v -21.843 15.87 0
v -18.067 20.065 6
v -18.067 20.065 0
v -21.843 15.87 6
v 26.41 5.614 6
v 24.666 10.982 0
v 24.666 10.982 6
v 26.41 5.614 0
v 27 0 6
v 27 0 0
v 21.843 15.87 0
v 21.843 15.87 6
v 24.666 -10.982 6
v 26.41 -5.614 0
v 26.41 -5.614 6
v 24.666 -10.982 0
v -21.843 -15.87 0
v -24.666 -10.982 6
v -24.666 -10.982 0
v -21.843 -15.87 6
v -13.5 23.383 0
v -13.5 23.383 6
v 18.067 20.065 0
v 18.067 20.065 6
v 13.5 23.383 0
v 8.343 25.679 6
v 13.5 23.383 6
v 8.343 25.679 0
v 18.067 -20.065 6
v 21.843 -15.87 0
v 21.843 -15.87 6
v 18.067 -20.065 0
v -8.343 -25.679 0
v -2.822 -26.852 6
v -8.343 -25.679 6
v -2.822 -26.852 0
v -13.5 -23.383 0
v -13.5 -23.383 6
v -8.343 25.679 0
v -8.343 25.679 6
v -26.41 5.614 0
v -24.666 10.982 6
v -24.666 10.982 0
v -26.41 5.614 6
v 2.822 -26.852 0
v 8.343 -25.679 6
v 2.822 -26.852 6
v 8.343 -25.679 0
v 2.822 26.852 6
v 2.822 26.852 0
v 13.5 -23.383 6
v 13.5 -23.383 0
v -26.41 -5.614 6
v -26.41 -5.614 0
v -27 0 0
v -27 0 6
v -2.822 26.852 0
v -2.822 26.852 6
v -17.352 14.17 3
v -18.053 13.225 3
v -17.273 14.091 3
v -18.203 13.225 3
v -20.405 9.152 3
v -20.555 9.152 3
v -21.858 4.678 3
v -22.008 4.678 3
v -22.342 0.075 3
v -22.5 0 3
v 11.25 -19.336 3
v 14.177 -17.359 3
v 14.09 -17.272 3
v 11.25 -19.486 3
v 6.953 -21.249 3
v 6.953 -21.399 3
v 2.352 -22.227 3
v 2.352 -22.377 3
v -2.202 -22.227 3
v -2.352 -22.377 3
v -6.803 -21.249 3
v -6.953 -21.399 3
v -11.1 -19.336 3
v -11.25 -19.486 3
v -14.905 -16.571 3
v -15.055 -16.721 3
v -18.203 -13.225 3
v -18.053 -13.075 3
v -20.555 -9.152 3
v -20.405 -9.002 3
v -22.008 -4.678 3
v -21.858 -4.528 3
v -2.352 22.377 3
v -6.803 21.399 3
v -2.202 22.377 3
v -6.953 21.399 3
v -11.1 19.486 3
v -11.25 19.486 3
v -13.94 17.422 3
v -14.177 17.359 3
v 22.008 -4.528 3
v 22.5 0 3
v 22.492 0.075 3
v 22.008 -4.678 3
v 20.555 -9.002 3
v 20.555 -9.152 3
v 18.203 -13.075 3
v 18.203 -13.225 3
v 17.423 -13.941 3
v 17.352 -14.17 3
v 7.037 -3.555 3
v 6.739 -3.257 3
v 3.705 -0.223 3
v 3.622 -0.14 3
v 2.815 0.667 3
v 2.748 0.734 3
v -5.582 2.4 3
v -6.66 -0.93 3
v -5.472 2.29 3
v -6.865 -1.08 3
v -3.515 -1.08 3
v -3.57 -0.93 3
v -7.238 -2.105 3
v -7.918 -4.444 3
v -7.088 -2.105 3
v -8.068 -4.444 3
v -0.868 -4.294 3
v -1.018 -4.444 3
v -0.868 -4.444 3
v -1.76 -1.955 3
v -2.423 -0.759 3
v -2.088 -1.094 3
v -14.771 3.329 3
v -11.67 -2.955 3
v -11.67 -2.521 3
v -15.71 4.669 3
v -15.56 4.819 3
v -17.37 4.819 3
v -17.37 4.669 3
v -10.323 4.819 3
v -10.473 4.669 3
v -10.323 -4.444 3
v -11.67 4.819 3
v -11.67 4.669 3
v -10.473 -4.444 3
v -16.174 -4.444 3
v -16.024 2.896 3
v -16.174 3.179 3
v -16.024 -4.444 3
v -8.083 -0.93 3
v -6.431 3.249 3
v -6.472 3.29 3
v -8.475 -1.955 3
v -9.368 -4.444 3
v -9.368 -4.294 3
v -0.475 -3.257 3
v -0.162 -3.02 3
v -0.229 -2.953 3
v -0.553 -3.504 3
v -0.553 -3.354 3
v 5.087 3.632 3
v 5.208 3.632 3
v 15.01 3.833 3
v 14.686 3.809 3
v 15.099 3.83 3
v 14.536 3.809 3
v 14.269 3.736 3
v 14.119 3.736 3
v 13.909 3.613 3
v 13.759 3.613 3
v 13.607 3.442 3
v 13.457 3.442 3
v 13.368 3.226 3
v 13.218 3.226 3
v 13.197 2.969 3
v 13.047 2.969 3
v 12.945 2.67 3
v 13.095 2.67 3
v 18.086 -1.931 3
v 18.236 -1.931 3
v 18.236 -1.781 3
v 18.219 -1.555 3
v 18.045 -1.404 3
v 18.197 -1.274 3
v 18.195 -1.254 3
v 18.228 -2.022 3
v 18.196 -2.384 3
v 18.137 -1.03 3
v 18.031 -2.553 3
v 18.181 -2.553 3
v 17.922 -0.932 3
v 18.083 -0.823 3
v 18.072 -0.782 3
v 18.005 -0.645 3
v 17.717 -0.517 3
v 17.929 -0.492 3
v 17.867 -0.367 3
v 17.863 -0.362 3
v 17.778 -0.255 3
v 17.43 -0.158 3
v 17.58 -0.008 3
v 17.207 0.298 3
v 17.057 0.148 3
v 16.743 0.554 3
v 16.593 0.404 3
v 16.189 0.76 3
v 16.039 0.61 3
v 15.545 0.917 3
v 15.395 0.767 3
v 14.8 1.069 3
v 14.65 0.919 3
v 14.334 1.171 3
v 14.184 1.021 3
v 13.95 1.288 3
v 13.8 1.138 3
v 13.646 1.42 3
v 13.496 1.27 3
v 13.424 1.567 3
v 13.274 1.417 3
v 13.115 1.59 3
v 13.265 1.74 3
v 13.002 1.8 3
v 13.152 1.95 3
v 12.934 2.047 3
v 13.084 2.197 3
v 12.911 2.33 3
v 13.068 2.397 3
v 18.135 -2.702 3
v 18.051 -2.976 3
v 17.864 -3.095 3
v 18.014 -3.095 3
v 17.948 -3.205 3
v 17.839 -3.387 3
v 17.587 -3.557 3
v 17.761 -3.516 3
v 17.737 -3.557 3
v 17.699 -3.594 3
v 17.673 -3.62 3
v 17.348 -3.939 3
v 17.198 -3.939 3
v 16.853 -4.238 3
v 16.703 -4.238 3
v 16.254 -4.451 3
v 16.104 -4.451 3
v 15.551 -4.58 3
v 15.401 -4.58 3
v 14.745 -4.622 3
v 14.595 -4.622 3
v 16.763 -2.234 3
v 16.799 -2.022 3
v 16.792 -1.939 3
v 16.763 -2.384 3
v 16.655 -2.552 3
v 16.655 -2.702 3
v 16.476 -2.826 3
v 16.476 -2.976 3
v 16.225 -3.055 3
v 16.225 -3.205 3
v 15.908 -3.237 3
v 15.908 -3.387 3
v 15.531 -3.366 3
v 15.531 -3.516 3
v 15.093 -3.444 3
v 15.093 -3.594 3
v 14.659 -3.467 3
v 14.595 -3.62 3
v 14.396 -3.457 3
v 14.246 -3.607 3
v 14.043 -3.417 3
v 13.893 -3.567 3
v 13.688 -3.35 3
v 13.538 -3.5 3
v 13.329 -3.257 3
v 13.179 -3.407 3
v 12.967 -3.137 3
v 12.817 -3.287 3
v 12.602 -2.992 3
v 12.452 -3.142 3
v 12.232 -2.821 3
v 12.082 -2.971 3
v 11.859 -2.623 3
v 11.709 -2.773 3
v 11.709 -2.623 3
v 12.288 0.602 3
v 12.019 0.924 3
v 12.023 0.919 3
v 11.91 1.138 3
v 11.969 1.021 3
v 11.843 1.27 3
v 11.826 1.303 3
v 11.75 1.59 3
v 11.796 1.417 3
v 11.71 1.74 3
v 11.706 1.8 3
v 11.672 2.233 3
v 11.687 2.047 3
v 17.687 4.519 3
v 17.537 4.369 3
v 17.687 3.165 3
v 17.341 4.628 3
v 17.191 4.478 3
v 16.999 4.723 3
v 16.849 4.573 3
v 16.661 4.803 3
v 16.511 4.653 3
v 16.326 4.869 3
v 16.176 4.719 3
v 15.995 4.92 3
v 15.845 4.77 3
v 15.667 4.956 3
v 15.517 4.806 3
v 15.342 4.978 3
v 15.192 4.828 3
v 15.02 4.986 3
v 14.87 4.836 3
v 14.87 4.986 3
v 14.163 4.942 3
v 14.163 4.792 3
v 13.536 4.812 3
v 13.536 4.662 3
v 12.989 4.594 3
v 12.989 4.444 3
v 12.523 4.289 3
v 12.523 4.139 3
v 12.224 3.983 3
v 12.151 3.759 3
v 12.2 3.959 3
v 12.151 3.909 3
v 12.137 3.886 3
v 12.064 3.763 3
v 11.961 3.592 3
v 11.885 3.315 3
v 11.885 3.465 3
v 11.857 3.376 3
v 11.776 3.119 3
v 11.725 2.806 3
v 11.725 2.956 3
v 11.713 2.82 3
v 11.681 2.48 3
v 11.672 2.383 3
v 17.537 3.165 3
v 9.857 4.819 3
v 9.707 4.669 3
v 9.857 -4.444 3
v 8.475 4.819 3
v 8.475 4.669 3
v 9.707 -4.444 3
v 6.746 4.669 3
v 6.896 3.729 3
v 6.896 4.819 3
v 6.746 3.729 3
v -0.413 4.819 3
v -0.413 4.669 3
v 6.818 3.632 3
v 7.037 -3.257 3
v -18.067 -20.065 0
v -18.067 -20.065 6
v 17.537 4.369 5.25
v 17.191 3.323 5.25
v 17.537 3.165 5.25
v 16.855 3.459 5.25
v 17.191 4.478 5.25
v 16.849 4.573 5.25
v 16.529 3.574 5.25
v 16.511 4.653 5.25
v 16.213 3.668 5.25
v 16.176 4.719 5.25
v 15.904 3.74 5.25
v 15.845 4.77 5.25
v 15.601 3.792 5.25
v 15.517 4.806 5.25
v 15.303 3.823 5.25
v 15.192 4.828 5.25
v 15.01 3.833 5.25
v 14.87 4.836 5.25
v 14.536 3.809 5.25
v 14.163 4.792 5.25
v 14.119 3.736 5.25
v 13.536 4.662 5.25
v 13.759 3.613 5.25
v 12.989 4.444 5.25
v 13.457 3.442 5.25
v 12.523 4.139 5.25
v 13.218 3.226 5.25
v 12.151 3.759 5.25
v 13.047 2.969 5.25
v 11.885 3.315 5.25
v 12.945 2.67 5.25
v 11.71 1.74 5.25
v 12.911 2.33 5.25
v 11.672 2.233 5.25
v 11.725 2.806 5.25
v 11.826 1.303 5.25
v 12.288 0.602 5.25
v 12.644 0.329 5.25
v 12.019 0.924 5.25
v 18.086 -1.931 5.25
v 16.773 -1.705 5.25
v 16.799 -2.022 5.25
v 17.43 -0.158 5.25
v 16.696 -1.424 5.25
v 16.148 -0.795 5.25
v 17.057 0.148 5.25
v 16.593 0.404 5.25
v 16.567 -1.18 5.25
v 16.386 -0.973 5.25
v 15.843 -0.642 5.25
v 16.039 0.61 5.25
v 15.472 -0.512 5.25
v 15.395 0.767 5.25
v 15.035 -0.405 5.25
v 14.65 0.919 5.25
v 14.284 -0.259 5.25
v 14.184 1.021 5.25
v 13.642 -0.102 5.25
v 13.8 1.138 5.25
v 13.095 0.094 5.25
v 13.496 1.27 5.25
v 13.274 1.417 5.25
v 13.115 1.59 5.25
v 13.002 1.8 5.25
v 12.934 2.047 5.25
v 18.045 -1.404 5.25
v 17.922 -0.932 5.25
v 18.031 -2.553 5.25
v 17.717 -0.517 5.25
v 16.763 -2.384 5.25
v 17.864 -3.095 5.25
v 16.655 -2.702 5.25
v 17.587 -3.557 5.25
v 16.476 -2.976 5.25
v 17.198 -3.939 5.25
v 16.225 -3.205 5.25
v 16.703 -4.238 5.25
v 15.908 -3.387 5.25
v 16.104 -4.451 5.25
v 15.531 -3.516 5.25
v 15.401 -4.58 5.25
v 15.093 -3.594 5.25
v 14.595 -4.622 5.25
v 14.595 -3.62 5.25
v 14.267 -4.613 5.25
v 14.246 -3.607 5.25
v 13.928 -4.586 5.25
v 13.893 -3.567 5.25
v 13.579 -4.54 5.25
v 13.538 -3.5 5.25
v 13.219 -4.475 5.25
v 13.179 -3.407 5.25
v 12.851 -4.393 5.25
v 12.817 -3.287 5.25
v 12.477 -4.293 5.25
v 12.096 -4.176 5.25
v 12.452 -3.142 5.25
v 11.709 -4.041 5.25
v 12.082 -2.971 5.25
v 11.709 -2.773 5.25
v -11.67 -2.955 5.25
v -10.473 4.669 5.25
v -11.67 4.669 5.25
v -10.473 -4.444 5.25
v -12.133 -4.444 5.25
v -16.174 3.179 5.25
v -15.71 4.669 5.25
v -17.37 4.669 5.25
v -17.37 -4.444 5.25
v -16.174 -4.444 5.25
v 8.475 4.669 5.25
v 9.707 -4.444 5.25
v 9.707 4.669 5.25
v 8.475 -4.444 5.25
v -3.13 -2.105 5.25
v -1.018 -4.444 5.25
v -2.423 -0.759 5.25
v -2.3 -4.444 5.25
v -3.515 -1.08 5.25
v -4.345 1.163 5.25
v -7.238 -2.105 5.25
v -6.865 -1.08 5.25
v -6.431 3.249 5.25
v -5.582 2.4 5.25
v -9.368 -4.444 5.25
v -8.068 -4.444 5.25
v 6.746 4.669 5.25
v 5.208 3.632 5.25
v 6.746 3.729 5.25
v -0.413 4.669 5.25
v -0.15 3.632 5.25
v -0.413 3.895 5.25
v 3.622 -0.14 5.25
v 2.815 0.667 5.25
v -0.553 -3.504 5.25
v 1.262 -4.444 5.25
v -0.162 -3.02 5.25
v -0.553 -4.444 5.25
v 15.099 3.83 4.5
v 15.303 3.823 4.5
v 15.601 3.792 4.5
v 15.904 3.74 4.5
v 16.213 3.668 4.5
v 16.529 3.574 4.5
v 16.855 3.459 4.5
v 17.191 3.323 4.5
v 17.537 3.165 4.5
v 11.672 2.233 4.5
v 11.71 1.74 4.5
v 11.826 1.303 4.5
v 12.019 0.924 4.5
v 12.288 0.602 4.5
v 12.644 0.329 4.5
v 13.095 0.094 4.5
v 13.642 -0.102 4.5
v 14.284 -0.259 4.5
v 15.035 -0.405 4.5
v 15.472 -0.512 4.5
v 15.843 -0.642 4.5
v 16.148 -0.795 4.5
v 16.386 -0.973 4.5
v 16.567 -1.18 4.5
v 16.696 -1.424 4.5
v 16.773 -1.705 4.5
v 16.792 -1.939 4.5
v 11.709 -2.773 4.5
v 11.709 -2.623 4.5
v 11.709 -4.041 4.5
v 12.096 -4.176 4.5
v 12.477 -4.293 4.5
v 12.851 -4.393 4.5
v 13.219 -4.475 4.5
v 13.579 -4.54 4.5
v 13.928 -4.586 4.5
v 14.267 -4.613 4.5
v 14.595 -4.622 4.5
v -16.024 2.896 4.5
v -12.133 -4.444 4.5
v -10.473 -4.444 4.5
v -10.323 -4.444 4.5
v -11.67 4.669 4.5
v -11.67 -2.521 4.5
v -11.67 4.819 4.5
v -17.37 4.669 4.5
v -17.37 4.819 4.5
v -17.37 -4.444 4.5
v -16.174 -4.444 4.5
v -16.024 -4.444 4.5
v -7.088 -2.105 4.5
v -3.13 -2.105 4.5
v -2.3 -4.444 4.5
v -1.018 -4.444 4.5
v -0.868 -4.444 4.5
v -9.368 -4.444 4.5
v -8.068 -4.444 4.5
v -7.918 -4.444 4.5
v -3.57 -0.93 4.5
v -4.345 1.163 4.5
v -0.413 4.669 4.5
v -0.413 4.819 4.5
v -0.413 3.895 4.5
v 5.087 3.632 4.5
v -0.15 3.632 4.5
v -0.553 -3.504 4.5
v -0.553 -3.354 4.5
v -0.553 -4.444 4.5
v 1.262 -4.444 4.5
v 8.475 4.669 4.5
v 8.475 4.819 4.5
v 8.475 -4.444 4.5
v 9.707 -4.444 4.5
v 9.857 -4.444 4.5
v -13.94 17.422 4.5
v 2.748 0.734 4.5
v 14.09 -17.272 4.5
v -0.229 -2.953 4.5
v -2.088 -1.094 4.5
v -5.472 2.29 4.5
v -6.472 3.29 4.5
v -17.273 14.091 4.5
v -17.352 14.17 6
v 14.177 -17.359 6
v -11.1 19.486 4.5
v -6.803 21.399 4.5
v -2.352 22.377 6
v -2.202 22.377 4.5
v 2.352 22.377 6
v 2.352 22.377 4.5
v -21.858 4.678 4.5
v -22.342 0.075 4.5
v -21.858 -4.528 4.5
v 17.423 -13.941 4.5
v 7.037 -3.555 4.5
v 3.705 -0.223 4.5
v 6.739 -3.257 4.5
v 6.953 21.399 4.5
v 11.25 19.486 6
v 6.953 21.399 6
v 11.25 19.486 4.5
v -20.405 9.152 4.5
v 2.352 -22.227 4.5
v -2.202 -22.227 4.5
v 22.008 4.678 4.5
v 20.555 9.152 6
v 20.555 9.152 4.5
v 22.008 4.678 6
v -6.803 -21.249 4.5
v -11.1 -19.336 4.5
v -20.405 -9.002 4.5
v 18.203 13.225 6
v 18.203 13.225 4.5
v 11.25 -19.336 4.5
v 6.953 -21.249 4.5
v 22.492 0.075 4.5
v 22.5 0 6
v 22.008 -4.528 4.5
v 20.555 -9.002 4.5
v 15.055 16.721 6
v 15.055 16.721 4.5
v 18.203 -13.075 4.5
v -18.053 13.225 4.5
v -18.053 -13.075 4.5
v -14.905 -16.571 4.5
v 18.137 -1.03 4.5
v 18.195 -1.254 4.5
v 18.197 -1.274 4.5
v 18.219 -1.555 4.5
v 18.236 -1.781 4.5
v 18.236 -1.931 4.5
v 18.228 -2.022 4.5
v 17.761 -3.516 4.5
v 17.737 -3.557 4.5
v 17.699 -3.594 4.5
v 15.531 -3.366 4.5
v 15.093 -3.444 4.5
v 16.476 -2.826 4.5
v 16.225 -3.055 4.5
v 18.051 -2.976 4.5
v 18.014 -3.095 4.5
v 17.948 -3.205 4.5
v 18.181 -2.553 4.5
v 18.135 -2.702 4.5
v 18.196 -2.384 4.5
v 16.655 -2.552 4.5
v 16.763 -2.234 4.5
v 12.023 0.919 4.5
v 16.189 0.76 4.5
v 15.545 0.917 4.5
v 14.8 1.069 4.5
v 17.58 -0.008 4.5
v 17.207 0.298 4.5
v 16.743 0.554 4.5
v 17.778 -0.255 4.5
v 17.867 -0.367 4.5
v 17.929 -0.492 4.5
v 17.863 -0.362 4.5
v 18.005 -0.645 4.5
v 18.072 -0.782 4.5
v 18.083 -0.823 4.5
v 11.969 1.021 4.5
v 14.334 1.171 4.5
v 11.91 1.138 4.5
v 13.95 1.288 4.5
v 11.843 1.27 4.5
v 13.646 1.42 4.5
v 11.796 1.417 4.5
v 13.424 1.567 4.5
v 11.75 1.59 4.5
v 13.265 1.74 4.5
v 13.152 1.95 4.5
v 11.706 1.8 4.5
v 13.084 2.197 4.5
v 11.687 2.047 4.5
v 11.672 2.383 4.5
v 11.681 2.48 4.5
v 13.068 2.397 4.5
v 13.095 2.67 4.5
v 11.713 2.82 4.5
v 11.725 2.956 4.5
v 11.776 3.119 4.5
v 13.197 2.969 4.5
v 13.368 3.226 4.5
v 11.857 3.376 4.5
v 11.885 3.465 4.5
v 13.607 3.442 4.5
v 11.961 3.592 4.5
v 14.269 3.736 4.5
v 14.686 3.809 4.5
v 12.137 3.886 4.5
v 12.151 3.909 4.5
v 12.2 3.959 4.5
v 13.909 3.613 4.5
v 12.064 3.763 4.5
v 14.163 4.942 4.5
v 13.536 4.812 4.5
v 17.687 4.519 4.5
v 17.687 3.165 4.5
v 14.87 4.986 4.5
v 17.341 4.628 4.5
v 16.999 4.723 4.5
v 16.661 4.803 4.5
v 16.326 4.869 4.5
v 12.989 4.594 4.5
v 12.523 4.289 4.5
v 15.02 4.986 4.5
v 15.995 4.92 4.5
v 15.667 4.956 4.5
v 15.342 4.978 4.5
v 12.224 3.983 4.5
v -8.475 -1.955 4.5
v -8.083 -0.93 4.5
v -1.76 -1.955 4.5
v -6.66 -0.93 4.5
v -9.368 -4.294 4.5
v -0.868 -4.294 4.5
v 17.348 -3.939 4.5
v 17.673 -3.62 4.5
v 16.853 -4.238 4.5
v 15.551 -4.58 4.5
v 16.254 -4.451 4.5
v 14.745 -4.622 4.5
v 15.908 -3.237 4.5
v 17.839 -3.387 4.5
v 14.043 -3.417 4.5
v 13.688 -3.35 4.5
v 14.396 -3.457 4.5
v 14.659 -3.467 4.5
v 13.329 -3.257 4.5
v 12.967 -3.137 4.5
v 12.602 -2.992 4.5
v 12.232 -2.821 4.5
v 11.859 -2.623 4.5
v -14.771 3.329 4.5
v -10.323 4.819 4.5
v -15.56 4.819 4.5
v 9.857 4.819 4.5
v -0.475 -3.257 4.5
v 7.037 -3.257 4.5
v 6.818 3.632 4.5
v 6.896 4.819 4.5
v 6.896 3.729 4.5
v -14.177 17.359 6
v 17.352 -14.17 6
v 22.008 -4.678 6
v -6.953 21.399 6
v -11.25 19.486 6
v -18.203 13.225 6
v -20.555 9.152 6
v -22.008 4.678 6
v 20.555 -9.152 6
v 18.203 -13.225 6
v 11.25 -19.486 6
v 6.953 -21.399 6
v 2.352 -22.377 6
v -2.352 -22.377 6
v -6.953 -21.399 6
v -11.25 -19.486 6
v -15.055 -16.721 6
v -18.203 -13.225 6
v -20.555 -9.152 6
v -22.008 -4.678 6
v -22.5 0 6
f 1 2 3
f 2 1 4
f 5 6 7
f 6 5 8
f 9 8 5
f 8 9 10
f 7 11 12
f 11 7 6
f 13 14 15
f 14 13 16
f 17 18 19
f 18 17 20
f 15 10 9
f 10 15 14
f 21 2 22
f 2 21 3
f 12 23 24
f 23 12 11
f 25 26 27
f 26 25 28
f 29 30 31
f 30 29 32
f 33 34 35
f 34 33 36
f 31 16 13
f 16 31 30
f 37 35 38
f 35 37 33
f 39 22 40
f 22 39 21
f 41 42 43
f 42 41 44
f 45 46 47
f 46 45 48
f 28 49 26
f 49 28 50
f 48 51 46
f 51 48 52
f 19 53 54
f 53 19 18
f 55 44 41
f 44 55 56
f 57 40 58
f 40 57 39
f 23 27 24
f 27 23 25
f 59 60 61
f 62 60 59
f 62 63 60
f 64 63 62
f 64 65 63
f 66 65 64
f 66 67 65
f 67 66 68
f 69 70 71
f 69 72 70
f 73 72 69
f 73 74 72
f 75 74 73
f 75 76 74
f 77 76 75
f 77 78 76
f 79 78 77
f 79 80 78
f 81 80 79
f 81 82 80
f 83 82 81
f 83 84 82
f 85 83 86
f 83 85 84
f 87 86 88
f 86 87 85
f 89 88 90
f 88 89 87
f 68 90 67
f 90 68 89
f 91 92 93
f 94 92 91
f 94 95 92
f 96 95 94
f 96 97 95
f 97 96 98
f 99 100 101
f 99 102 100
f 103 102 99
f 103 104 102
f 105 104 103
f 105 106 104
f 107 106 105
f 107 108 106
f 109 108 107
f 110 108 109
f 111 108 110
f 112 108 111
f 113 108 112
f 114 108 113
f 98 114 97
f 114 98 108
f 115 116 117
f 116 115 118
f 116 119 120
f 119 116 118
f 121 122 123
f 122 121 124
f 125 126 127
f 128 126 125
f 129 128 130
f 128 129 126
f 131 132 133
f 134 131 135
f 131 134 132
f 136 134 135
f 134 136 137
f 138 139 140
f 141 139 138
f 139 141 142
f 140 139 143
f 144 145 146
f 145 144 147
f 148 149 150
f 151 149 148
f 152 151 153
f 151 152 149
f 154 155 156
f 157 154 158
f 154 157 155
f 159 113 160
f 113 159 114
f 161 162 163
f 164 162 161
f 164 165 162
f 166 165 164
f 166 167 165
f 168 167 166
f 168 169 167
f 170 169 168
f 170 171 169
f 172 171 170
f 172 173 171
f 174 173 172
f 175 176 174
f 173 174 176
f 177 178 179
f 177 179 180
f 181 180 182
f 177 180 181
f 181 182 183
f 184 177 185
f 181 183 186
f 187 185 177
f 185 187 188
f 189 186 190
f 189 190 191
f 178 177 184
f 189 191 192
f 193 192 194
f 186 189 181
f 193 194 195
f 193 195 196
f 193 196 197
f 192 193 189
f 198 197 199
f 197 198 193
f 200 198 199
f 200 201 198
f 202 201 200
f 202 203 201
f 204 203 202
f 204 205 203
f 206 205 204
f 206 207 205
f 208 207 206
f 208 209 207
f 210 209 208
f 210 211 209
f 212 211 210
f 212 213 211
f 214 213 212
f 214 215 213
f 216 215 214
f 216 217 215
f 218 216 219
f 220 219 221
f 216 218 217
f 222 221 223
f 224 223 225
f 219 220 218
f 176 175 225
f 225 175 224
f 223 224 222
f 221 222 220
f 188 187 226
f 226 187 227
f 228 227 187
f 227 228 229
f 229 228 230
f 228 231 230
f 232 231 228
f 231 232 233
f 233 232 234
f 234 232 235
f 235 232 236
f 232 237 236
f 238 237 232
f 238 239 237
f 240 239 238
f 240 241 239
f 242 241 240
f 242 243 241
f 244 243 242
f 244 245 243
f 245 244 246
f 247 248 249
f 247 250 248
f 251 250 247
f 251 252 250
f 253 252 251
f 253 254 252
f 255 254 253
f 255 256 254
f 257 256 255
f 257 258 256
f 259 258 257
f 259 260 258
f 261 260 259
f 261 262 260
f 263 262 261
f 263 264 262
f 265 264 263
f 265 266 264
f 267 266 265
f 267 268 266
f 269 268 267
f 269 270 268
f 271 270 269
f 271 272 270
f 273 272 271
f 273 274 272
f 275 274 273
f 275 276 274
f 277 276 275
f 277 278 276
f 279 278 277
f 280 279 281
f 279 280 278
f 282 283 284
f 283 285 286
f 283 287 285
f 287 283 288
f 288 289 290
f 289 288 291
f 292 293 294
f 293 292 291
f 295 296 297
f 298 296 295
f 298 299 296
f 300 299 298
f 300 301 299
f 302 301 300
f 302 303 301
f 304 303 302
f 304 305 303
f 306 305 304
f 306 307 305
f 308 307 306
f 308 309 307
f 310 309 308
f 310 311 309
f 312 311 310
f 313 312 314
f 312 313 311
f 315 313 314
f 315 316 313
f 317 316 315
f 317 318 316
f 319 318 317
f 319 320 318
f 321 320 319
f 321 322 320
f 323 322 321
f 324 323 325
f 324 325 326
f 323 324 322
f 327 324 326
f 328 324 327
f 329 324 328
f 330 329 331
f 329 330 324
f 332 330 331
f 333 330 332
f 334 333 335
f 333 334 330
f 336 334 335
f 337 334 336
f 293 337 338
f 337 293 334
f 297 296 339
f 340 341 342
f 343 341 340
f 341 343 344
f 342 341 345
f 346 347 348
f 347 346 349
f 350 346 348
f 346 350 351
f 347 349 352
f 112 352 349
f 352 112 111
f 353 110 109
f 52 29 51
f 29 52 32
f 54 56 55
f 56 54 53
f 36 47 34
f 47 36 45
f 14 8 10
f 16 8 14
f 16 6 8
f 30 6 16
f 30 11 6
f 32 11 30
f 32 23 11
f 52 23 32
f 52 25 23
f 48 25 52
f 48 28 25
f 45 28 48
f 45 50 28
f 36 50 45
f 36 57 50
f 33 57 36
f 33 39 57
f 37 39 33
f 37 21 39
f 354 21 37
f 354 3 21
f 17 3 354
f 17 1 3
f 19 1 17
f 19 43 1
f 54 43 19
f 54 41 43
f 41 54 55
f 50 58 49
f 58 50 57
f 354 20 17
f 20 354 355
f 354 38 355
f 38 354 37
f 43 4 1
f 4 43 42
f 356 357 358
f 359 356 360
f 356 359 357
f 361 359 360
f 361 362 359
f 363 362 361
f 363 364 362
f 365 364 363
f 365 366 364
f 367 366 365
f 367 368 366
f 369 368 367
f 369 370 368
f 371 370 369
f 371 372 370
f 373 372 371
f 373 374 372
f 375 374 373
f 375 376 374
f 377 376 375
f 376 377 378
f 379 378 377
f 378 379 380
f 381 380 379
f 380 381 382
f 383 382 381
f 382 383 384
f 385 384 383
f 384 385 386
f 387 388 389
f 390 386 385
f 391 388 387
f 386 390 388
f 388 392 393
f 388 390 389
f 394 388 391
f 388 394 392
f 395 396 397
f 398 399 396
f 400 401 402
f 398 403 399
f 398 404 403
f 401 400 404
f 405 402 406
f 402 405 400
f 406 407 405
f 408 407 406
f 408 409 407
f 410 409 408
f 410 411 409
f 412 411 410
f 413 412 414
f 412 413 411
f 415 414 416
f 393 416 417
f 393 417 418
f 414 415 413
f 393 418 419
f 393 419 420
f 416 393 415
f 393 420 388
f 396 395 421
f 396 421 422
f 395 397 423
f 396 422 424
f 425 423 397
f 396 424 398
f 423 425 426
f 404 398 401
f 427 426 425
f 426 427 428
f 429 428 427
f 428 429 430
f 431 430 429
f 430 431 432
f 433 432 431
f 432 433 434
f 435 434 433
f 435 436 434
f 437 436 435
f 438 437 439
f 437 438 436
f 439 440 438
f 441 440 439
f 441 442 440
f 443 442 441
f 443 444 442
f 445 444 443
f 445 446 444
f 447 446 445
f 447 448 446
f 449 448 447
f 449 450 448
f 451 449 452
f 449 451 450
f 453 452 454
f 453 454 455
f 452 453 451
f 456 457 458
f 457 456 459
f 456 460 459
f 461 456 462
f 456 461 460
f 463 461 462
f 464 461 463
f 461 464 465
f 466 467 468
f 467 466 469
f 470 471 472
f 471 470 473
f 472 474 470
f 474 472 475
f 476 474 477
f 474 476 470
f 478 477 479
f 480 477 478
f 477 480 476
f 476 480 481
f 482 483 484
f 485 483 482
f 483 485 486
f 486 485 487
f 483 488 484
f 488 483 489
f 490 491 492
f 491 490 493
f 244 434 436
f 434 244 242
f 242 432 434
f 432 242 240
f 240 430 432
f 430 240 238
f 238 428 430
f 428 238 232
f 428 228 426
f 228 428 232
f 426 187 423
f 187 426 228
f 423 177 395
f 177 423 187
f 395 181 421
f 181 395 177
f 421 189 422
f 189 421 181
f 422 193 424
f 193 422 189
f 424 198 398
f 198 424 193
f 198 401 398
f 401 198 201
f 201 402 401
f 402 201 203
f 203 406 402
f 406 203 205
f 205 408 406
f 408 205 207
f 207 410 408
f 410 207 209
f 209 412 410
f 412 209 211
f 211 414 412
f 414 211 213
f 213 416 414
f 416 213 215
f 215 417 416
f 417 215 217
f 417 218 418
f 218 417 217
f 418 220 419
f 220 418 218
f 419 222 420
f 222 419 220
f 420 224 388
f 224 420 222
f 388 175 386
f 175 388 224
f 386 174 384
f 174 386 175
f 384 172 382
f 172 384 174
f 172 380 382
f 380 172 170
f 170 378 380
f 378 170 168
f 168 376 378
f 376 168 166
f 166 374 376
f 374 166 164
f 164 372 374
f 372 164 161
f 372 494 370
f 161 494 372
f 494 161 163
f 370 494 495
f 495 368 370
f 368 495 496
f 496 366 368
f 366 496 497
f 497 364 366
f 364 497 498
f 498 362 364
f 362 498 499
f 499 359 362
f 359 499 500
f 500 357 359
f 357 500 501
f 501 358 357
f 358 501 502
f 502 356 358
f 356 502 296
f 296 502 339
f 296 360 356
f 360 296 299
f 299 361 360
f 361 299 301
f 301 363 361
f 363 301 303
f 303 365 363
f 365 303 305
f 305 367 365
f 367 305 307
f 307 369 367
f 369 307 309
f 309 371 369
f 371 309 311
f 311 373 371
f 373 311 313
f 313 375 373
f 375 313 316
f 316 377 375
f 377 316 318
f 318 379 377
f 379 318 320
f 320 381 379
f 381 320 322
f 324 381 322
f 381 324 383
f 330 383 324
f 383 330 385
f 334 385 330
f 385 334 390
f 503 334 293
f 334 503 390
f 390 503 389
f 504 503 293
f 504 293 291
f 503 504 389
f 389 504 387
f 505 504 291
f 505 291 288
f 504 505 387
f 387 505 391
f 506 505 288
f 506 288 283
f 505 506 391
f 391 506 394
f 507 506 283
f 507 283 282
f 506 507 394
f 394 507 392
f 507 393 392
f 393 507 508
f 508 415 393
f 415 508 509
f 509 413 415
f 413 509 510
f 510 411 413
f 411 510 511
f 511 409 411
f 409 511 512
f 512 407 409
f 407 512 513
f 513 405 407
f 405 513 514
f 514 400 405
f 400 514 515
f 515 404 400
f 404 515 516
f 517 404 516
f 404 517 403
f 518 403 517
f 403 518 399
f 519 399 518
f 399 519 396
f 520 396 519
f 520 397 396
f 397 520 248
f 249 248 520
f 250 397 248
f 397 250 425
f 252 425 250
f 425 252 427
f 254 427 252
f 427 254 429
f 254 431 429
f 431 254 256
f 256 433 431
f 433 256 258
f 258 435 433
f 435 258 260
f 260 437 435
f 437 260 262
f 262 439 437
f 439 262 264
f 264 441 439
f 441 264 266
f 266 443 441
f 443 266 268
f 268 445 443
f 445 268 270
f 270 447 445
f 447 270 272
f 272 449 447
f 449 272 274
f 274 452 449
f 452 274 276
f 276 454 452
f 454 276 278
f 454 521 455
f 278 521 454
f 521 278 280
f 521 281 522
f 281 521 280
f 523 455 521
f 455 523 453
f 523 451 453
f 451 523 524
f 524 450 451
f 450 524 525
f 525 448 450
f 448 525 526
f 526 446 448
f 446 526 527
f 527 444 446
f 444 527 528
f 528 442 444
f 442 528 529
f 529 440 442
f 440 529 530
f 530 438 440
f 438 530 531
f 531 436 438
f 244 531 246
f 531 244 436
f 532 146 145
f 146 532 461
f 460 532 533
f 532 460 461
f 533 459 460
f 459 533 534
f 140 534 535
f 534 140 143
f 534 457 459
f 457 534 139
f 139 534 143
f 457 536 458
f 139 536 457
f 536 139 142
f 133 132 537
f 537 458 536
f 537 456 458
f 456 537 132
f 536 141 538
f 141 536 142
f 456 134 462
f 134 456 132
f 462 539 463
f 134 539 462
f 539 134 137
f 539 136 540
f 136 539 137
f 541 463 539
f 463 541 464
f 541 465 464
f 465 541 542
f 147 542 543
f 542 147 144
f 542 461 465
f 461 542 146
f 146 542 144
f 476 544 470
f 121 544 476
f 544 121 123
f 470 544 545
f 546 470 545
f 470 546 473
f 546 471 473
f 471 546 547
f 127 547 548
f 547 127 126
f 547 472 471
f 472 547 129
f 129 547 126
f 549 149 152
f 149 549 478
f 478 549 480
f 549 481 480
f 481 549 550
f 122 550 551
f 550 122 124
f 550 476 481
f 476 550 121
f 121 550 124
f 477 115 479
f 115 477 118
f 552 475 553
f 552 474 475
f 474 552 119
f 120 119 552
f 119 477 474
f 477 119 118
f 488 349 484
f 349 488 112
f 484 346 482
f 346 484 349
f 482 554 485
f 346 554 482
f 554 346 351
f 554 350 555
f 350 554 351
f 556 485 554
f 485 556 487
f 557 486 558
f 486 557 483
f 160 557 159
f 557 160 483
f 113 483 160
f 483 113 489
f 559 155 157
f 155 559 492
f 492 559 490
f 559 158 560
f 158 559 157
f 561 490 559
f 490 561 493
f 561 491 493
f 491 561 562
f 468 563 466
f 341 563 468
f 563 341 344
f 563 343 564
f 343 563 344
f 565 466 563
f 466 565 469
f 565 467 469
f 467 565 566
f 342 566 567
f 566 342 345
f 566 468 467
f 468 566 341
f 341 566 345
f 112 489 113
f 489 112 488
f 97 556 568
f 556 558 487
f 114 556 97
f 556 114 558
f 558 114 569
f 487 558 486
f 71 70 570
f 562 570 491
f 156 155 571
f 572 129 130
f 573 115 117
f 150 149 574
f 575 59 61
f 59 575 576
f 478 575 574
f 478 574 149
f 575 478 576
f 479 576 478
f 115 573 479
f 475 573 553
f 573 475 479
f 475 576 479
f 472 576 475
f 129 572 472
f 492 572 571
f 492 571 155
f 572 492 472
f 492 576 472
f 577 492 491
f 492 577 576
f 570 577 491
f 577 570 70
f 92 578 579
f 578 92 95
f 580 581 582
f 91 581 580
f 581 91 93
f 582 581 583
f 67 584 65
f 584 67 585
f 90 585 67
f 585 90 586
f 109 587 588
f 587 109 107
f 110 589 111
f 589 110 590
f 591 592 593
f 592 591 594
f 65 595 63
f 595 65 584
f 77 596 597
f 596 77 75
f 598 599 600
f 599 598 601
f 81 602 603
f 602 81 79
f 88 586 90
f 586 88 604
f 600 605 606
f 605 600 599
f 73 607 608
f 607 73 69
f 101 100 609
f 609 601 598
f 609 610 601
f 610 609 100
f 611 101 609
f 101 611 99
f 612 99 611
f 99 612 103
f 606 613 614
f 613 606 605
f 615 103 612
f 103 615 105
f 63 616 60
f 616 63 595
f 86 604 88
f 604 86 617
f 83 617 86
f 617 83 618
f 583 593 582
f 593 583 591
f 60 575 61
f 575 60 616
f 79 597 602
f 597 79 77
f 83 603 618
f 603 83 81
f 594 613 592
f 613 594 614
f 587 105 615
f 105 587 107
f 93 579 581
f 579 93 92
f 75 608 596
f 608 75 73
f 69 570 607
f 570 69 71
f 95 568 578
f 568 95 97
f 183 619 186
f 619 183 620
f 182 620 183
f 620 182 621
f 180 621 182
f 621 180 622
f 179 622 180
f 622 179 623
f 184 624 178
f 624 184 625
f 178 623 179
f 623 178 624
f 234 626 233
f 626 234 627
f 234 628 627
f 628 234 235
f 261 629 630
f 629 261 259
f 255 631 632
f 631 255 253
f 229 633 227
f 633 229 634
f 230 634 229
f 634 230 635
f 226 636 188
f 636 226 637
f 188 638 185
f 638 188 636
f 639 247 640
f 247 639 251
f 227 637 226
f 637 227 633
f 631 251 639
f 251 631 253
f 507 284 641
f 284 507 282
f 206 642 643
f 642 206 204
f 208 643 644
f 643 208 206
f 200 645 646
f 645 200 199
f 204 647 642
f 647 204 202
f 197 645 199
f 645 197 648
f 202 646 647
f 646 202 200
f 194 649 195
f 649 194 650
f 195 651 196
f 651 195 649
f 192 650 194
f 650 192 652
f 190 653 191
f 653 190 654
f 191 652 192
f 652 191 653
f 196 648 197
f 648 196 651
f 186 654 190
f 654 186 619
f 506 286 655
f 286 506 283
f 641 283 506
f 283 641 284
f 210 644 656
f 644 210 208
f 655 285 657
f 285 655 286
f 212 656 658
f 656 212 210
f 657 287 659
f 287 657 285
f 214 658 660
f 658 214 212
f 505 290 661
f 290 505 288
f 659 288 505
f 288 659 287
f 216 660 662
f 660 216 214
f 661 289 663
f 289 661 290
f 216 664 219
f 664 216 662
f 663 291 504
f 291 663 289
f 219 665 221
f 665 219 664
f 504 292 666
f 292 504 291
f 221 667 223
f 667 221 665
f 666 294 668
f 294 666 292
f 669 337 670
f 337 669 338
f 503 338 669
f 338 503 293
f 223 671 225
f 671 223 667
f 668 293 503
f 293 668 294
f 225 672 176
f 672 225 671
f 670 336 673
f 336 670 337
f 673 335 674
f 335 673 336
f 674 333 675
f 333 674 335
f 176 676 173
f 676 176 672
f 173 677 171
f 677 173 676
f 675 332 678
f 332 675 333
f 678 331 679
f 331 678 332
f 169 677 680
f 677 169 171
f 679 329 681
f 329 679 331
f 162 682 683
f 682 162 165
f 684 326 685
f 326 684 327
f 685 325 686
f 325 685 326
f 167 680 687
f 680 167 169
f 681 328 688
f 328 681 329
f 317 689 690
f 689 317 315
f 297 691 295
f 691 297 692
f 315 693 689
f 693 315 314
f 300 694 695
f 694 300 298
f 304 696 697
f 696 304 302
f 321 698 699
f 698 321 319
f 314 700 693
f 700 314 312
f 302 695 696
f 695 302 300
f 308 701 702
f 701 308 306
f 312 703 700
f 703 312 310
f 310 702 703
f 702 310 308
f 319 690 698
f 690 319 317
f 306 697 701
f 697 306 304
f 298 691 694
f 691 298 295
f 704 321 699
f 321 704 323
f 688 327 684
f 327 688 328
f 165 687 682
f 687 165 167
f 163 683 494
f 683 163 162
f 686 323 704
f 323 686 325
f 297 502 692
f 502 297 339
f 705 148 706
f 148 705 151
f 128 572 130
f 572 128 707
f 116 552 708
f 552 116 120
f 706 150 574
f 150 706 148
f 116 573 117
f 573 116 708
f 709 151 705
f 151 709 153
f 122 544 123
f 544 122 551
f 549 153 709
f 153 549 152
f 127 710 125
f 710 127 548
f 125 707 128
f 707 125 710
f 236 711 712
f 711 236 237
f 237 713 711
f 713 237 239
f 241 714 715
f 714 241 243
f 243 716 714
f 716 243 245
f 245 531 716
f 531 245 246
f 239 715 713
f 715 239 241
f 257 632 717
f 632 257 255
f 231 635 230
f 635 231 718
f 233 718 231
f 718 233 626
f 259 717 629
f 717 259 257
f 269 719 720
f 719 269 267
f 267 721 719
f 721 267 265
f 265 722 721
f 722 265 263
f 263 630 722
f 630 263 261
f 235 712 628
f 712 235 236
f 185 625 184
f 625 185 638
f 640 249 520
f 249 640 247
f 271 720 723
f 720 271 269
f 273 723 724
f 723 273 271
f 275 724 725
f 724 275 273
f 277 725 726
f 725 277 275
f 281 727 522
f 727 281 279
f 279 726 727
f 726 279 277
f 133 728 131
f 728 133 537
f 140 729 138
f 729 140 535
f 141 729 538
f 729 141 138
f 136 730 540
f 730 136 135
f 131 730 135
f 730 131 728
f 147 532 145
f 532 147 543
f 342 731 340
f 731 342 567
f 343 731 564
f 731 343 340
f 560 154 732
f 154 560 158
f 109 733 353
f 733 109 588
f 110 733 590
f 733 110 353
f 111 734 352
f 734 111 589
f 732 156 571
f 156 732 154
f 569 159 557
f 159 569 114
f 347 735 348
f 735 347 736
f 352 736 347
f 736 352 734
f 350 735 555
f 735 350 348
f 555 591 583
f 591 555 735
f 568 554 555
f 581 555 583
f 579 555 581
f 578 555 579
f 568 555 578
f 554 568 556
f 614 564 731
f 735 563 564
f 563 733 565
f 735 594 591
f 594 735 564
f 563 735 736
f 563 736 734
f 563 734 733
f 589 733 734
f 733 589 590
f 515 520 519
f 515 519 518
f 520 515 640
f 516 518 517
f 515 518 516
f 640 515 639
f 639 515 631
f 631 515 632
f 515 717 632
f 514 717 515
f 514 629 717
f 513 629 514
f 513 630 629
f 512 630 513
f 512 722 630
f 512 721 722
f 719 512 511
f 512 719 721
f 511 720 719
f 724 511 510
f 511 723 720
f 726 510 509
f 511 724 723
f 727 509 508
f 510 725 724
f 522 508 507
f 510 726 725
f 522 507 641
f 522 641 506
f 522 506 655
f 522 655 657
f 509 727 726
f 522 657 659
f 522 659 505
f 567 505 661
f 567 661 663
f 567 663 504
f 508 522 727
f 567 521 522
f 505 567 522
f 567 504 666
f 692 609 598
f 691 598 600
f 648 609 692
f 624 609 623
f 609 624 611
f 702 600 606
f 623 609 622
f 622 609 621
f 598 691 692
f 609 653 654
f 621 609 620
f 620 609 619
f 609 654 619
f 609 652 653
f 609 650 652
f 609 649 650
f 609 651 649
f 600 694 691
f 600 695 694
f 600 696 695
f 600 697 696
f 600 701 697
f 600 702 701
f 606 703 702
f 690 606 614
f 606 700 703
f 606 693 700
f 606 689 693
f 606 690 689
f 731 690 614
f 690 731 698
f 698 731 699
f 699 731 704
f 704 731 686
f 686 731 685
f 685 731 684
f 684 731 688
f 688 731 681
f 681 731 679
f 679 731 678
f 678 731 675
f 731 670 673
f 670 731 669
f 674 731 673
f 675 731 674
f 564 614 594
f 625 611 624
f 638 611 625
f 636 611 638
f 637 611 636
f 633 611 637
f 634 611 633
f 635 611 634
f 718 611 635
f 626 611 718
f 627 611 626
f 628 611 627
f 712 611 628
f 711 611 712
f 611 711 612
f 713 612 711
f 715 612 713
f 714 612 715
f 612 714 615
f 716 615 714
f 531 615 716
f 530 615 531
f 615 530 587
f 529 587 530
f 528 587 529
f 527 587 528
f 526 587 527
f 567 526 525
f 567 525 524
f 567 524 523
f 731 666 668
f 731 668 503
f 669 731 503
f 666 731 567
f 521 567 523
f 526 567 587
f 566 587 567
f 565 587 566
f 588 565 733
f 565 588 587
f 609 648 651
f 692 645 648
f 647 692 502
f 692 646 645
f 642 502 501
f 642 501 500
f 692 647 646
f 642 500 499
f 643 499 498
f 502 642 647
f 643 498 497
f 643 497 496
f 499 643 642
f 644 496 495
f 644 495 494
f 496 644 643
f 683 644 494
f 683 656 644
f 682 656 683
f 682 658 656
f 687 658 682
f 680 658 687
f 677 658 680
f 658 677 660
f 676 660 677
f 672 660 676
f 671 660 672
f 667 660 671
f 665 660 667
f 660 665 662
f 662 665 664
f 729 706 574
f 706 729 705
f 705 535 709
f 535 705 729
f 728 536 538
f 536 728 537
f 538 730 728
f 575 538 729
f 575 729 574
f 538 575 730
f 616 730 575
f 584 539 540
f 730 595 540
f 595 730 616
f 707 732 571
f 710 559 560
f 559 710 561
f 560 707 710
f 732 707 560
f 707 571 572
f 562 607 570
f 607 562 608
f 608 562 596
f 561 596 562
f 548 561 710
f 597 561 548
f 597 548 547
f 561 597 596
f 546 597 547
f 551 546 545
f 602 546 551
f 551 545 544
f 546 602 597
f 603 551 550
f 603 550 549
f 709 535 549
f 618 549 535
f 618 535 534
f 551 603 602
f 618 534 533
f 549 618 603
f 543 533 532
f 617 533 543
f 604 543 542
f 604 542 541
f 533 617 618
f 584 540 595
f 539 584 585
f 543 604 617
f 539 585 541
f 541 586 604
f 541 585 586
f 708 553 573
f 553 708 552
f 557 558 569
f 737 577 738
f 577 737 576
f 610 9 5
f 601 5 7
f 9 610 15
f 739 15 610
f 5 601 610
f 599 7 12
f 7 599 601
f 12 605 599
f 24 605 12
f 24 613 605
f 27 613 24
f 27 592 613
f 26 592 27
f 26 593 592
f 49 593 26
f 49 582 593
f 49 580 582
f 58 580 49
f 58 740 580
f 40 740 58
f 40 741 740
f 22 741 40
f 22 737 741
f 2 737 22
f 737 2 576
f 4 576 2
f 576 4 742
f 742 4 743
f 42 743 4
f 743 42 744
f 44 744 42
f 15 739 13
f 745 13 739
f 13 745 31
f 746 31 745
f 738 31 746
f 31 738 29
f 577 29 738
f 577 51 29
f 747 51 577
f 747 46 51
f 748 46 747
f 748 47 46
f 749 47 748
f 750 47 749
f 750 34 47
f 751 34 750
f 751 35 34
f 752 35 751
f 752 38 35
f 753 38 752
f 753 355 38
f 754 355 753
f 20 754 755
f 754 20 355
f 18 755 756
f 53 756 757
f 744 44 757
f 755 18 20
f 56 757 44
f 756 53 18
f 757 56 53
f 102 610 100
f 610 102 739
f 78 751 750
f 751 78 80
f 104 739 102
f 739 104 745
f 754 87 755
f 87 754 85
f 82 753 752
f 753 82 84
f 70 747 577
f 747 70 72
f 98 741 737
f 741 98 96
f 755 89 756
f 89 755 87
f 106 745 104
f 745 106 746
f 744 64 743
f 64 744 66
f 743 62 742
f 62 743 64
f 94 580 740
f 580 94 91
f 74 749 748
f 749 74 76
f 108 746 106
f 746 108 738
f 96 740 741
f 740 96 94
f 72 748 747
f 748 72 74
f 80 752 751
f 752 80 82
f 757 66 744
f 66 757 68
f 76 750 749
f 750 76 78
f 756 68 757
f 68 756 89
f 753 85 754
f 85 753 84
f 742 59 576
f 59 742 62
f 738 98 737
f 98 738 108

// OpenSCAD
union() {
	color(alpha = 1.0, c = [0, 0, 0]) {
		translate(v = [0, 0, 3.0]) {
			difference() {
				union() {
					translate(v = [0, 0, -3.0]) {
						cylinder(h = 3.0, r = 27.0);
					}
					linear_extrude(height = 2.25) {
						text(font = "Mic 32Bold", halign = "center", size = 9, text = "NAZIS", valign = "center");
					}
				}
				minkowski() {
					union() {
						difference() {
							cylinder(h = 3.0, r = 27.0);
							cylinder(h = 3.0, r = 22.5);
						}
						rotate(a = [0, 0, -45]) {
							translate(v = [-24.75, 0, 0]) {
								translate(v = [0, -2.25, 0]) {
									cube(size = [49.5, 4.5, 3.0]);
								}
							}
						}
					}
					cube(size = [0.15, 0.15, 0.15]);
				}
			}
		}
	}
	translate(v = [0, 0, 3.0]) {
		color(alpha = 1.0, c = [1, 1, 1]) {
			difference() {
				cylinder(h = 1.5, r = 22.5);
				minkowski() {
					linear_extrude(height = 2.25) {
						text(font = "Mic 32Bold", halign = "center", size = 9, text = "NAZIS", valign = "center");
					}
					cube(size = [0.15, 0.15, 0.15]);
				}
				minkowski() {
					union() {
						difference() {
							cylinder(h = 3.0, r = 27.0);
							cylinder(h = 3.0, r = 22.5);
						}
						rotate(a = [0, 0, -45]) {
							translate(v = [-24.75, 0, 0]) {
								translate(v = [0, -2.25, 0]) {
									cube(size = [49.5, 4.5, 3.0]);
								}
							}
						}
					}
					cube(size = [0.15, 0.15, 0.15]);
				}
			}
		}
	}
	translate(v = [0, 0, 3.0]) {
		color(alpha = 1.0, c = [1, 0, 0]) {
			union() {
				difference() {
					cylinder(h = 3.0, r = 27.0);
					cylinder(h = 3.0, r = 22.5);
				}
				rotate(a = [0, 0, -45]) {
					translate(v = [-24.75, 0, 0]) {
						translate(v = [0, -2.25, 0]) {
							cube(size = [49.5, 4.5, 3.0]);
						}
					}
				}
			}
		}
	}
}
